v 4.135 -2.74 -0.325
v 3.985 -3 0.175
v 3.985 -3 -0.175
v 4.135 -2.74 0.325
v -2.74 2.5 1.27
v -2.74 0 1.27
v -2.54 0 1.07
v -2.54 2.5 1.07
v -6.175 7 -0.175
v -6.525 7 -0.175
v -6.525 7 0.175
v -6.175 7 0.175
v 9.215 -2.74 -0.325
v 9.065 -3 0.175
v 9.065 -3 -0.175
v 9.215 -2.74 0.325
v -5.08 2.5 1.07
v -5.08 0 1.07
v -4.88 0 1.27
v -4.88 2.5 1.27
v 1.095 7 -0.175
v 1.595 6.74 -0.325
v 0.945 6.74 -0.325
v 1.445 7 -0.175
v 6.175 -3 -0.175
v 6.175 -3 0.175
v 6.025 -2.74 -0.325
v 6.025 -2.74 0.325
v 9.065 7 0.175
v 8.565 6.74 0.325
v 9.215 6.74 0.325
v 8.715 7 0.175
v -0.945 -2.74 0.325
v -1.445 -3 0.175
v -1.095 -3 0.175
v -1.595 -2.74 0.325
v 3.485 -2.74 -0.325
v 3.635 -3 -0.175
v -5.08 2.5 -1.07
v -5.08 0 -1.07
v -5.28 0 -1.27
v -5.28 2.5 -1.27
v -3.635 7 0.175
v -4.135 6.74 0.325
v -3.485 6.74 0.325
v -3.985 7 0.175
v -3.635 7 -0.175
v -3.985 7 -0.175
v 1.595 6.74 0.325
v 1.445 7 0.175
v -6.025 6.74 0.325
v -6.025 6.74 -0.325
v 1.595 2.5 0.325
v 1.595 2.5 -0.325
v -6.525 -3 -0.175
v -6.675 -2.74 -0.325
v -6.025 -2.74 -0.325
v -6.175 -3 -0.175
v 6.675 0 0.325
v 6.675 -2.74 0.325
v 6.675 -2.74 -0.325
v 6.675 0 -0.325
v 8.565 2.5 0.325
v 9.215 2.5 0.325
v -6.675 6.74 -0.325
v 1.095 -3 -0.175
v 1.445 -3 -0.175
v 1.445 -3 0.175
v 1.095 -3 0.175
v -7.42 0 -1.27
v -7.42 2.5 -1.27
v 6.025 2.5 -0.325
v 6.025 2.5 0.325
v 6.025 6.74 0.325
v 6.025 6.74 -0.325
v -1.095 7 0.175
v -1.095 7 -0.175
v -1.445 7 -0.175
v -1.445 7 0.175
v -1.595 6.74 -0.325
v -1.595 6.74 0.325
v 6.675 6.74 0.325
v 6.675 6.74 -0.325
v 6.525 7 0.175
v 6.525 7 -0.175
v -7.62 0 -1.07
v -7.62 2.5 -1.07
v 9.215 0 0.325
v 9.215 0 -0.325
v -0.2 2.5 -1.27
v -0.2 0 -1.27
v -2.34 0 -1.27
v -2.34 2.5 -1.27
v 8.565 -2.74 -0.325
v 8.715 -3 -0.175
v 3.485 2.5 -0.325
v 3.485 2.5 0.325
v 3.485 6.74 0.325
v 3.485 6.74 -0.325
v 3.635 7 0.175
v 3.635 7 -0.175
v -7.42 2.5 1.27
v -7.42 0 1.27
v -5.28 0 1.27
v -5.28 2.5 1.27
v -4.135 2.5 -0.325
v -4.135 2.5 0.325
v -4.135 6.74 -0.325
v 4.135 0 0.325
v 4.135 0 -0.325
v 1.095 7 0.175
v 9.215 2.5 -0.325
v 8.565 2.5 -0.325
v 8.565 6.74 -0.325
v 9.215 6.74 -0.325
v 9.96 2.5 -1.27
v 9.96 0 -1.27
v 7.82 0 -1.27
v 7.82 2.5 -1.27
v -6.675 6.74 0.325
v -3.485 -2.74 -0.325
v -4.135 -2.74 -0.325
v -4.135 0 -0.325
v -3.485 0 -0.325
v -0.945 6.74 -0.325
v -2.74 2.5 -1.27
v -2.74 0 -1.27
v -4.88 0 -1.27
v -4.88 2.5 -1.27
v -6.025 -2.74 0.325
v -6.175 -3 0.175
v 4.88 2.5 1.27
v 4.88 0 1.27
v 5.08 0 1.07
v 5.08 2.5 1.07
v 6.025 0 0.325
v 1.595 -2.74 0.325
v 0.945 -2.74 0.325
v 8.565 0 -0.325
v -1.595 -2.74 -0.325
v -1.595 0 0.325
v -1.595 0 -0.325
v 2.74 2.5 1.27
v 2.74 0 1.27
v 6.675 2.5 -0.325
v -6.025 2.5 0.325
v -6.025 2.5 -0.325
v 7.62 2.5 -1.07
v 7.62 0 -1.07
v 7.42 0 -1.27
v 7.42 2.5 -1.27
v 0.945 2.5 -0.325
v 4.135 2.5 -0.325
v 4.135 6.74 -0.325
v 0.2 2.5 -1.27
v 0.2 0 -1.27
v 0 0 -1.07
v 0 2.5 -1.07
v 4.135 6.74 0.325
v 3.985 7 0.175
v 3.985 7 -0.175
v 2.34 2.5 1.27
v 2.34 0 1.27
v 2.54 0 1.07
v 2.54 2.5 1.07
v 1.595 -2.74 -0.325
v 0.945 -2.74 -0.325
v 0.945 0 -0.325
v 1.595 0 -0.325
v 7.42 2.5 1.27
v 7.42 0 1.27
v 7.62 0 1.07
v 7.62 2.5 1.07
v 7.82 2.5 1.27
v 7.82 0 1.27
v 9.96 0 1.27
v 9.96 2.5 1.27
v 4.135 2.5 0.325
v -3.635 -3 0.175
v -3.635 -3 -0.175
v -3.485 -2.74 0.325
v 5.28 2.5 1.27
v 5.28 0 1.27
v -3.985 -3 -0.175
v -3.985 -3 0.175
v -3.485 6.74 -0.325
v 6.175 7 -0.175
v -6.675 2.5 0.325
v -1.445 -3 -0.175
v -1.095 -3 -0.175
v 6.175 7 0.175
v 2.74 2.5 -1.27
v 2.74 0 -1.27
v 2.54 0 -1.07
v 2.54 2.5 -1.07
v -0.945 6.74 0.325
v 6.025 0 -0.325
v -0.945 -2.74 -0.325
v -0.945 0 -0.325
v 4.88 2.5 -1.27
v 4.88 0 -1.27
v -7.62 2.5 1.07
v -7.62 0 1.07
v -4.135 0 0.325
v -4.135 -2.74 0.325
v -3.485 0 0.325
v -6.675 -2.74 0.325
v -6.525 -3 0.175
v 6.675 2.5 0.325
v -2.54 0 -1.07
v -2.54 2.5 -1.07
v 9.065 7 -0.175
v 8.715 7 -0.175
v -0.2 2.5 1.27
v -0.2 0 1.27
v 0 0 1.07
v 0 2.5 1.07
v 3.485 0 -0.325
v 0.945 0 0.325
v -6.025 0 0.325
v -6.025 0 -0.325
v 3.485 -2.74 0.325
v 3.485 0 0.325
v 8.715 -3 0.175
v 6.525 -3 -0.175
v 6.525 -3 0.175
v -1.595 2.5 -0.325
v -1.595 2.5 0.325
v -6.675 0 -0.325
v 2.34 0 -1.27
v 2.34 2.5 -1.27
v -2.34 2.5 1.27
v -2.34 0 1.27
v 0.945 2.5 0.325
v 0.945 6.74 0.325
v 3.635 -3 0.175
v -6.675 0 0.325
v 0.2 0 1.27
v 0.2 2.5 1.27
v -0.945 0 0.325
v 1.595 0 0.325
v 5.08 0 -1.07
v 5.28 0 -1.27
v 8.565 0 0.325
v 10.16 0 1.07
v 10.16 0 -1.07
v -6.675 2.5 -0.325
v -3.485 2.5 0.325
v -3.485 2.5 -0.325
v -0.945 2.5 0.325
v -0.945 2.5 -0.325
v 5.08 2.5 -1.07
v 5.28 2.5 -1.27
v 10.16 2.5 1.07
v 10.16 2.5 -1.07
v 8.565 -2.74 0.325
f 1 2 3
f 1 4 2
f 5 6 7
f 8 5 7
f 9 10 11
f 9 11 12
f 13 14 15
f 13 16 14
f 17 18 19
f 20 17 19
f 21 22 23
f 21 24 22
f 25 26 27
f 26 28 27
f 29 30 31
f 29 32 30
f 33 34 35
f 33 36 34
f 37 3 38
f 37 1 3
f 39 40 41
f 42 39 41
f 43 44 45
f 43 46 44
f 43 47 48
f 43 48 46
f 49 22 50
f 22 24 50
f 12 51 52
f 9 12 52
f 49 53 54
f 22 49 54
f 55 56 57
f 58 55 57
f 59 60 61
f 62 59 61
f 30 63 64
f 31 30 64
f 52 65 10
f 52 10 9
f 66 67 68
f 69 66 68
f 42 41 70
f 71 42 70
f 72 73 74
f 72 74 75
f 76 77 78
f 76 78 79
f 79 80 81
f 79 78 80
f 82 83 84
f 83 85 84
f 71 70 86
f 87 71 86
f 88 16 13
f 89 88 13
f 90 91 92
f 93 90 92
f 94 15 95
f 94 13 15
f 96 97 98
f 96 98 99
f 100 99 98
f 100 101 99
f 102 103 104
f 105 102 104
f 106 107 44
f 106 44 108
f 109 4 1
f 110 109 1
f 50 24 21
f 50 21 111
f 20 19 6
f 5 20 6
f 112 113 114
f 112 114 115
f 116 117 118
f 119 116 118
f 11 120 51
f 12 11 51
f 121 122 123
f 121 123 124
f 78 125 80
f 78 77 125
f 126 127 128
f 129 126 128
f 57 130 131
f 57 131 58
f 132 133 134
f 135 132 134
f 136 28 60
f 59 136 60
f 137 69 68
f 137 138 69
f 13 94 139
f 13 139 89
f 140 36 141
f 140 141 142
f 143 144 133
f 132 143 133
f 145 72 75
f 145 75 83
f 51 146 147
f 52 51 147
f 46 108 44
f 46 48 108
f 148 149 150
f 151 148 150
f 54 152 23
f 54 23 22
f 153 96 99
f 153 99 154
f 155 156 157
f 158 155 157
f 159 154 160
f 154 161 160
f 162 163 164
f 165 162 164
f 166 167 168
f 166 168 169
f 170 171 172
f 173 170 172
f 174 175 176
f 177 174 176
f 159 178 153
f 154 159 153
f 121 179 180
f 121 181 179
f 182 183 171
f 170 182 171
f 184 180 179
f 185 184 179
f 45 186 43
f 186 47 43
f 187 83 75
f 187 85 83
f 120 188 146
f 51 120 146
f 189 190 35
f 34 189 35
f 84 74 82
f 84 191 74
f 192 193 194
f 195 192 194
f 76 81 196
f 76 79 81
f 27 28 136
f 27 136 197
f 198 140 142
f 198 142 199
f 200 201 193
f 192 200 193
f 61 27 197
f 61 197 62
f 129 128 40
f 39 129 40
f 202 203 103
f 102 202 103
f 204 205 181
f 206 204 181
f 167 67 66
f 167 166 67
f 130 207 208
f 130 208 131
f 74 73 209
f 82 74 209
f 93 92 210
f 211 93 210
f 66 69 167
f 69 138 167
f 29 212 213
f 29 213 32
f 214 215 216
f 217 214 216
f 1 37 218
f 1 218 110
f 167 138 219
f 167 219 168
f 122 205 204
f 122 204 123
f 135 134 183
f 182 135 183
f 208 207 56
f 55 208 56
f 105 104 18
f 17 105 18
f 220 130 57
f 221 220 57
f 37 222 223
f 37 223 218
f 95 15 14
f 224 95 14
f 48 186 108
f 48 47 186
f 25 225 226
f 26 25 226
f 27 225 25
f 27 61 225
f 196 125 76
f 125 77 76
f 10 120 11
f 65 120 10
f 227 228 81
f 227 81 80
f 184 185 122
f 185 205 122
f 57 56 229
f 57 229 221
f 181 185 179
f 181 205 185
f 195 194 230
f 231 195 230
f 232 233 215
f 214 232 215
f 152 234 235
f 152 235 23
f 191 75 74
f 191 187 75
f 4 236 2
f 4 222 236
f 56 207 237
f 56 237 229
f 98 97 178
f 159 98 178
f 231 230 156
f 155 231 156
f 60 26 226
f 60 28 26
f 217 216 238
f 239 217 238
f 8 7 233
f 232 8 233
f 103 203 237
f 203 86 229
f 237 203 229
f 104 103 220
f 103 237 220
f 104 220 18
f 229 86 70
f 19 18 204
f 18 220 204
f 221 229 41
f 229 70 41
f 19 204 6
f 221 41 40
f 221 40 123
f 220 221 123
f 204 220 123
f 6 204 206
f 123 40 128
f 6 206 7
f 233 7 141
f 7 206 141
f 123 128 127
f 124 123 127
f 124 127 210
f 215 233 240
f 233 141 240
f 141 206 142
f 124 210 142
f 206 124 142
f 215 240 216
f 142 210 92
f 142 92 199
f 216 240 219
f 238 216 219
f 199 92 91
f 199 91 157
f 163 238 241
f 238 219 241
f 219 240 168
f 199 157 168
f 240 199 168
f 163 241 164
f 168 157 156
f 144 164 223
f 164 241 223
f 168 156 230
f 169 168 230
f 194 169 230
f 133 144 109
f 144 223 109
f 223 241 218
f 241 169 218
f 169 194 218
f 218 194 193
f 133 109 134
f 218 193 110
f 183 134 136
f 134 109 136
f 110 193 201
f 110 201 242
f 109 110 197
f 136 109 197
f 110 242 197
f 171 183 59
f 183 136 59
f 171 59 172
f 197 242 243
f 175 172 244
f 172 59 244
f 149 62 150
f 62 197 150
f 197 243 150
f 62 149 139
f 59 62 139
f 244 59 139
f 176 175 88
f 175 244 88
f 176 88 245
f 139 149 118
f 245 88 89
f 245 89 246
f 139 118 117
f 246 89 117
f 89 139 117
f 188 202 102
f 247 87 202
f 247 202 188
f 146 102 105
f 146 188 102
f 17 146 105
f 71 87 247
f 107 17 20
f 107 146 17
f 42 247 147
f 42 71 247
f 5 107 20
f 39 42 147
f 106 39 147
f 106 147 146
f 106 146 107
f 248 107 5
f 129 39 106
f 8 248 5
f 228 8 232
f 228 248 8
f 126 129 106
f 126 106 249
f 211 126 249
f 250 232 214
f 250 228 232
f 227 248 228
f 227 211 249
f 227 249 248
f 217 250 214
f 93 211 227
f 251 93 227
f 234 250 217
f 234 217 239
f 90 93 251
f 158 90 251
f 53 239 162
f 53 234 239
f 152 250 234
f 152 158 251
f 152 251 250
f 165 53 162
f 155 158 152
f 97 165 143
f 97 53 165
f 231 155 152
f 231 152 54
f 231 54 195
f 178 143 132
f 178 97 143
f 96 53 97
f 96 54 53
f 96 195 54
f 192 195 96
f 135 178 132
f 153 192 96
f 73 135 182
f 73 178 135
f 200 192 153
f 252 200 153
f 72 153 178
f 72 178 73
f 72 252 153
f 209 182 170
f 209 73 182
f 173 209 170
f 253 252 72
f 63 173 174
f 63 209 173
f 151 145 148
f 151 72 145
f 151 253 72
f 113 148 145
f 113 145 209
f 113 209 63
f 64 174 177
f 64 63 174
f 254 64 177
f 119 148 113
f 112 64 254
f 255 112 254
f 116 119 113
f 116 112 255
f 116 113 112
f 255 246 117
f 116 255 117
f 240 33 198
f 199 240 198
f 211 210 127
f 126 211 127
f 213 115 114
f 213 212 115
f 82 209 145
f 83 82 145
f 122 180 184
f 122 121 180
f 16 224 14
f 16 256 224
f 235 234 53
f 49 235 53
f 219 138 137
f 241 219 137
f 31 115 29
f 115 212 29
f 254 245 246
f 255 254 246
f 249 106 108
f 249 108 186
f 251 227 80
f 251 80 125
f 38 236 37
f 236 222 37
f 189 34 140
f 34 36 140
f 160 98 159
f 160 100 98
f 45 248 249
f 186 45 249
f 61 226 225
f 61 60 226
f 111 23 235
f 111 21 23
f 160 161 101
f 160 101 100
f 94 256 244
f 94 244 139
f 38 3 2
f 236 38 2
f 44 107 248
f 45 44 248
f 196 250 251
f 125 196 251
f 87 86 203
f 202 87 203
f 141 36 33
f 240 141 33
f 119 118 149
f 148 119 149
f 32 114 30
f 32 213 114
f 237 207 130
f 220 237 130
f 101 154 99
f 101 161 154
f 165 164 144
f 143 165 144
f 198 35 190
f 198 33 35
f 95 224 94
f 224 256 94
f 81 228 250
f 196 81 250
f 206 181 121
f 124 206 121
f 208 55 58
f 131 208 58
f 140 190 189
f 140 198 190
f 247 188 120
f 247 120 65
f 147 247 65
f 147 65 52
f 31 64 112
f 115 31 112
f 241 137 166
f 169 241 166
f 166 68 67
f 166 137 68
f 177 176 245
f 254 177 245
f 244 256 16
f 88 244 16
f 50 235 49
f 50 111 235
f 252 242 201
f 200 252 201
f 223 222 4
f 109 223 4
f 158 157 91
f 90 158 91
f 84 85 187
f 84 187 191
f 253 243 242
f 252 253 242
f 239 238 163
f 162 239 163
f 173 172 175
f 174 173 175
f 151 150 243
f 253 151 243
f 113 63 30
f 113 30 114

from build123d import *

# Parameters (mm, degrees)
BOSS_EXTRUDE1_DEPTH   = 2.5
SKETCH3_W             = 0.65
SKETCH3_H             = 0.65
BOSS_EXTRUDE2_DEPTH   = 10
CHAMFER2_SIZE         = 0.15
CHAMFER2_SIZE2        = 0.259807621
CHAMFER3_SIZE         = 0.15
CHAMFER3_SIZE2        = 0.259807621
LPATTERN2_DEPTH       = 2.5
LPATTERN2_START       = -2.740192379
LPATTERN2_2_OUTLINE_W = 0.65
LPATTERN2_2_OUTLINE_H = 0.65
LPATTERN2_2_DEPTH     = 9.480384758


with BuildPart() as part:
    # Sketch1 → Boss-Extrude1 (new body)
    with BuildSketch(Plane(origin=(0, 0, 0), x_dir=(1, 0, 0), z_dir=(0, 1, 0))):
        Polygon((-7.42, 1.27), (-7.62, 1.07), (-7.62, -1.07), (-7.42, -1.27), (-5.28, -1.27), (-5.08, -1.07), (-5.08, 1.07), (-5.28, 1.27), align=None)
    extrude(amount=BOSS_EXTRUDE1_DEPTH)

    # Sketch3 → Boss-Extrude2 (add)
    with BuildSketch(Plane(origin=(0, -3, 0), x_dir=(1, 0, 0), z_dir=(0, 1, 0))):
        with Locations((-6.35, 0)):
            Rectangle(SKETCH3_W, SKETCH3_H)
    extrude(amount=BOSS_EXTRUDE2_DEPTH)

    # Chamfer2
    chamfer2_edges = [part.edges().sort_by_distance(p)[0] for p in [
        (-6.025, -3, 0),
        (-6.35, -3, -0.325),
        (-6.675, -3, 0),
        (-6.35, -3, 0.325),
    ]]
    chamfer2_side = [part.faces().sort_by_distance(p)[0] for p in [
        (-6.35, -3, 0),
    ]]
    chamfer(chamfer2_edges, length=CHAMFER2_SIZE, length2=CHAMFER2_SIZE2, reference=chamfer2_side[0])

    # Chamfer3
    chamfer3_edges = [part.edges().sort_by_distance(p)[0] for p in [
        (-6.025, 7, 0),
        (-6.35, 7, -0.325),
        (-6.675, 7, 0),
        (-6.35, 7, 0.325),
    ]]
    chamfer3_side = [part.faces().sort_by_distance(p)[0] for p in [
        (-6.35, 7, 0),
    ]]
    chamfer(chamfer3_edges, length=CHAMFER3_SIZE, length2=CHAMFER3_SIZE2, reference=chamfer3_side[0])

    # LPattern2: read off the stored shape, not the designer's step
    # LPattern2 outline → LPattern2 (add)
    with BuildSketch(Plane(origin=(0, 0, 0), x_dir=(1, 0, 0), z_dir=(0, 1, 0))):
        Polygon((-2.74, 1.27), (-4.88, 1.27), (-5.08, 1.07), (-5.08, -1.07), (-4.88, -1.27), (-2.74, -1.27), (-2.54, -1.07), (-2.34, -1.27), (-0.2, -1.27), (0, -1.07), (0.2, -1.27), (2.34, -1.27), (2.54, -1.07), (2.74, -1.27), (4.88, -1.27), (5.08, -1.07), (5.28, -1.27), (7.42, -1.27), (7.62, -1.07), (7.82, -1.27), (9.96, -1.27), (10.16, -1.07), (10.16, 1.07), (9.96, 1.27), (7.82, 1.27), (7.62, 1.07), (7.42, 1.27), (5.28, 1.27), (5.08, 1.07), (4.88, 1.27), (2.74, 1.27), (2.54, 1.07), (2.34, 1.27), (0.2, 1.27), (0, 1.07), (-0.2, 1.27), (-2.34, 1.27), (-2.54, 1.07), align=None)
    extrude(amount=LPATTERN2_DEPTH)

    # LPattern2 2 outline → LPattern2 2 (add)
    with BuildSketch(Plane(origin=(0, 0, 0), x_dir=(1, 0, 0), z_dir=(0, 1, 0)).offset(LPATTERN2_START)):
        with Locations((-3.81, 0)):
            Rectangle(LPATTERN2_2_OUTLINE_W, LPATTERN2_2_OUTLINE_H)
        with Locations((-1.27, 0)):
            Rectangle(LPATTERN2_2_OUTLINE_W, LPATTERN2_2_OUTLINE_H)
        with Locations((1.27, 0)):
            Rectangle(LPATTERN2_2_OUTLINE_W, LPATTERN2_2_OUTLINE_H)
        with Locations((3.81, 0)):
            Rectangle(LPATTERN2_2_OUTLINE_W, LPATTERN2_2_OUTLINE_H)
        with Locations((6.35, 0)):
            Rectangle(LPATTERN2_2_OUTLINE_W, LPATTERN2_2_OUTLINE_H)
        with Locations((8.89, 0)):
            Rectangle(LPATTERN2_2_OUTLINE_W, LPATTERN2_2_OUTLINE_H)
    extrude(amount=LPATTERN2_2_DEPTH)

    # LPattern2 3: loft between two sections, ruled curve by curve
    lpattern2_3_from = [
        Edge.make_line((-3.985, -3, 0.175), (-3.635, -3, 0.175)),
        Edge.make_line((-3.635, -3, -0.175), (-3.985, -3, -0.175)),
        Edge.make_line((-3.635, -3, 0.175), (-3.635, -3, -0.175)),
        Edge.make_line((-3.985, -3, 0.175), (-3.985, -3, -0.175)),
    ]
    lpattern2_3_to = [
        Edge.make_line((-4.135, -2.740192379, 0.325), (-3.485, -2.740192379, 0.325)),
        Edge.make_line((-3.485, -2.740192379, -0.325), (-4.135, -2.740192379, -0.325)),
        Edge.make_line((-3.485, -2.740192379, 0.325), (-3.485, -2.740192379, -0.325)),
        Edge.make_line((-4.135, -2.740192379, 0.325), (-4.135, -2.740192379, -0.325)),
    ]
    lpattern2_3 = Solid(Shell([*[Face.make_surface_from_curves(lpattern2_3_from[k], lpattern2_3_to[k]) for k in range(4)], Face(Wire(lpattern2_3_from)), Face(Wire(lpattern2_3_to))]))
    add(lpattern2_3)

    # LPattern2 4: loft between two sections, ruled curve by curve
    lpattern2_4_from = [
        Edge.make_line((-1.445, -3, 0.175), (-1.095, -3, 0.175)),
        Edge.make_line((-1.095, -3, -0.175), (-1.445, -3, -0.175)),
        Edge.make_line((-1.095, -3, 0.175), (-1.095, -3, -0.175)),
        Edge.make_line((-1.445, -3, 0.175), (-1.445, -3, -0.175)),
    ]
    lpattern2_4_to = [
        Edge.make_line((-1.595, -2.740192379, 0.325), (-0.945, -2.740192379, 0.325)),
        Edge.make_line((-0.945, -2.740192379, -0.325), (-1.595, -2.740192379, -0.325)),
        Edge.make_line((-0.945, -2.740192379, 0.325), (-0.945, -2.740192379, -0.325)),
        Edge.make_line((-1.595, -2.740192379, 0.325), (-1.595, -2.740192379, -0.325)),
    ]
    lpattern2_4 = Solid(Shell([*[Face.make_surface_from_curves(lpattern2_4_from[k], lpattern2_4_to[k]) for k in range(4)], Face(Wire(lpattern2_4_from)), Face(Wire(lpattern2_4_to))]))
    add(lpattern2_4)

    # LPattern2 5: loft between two sections, ruled curve by curve
    lpattern2_5_from = [
        Edge.make_line((1.095, -3, 0.175), (1.445, -3, 0.175)),
        Edge.make_line((1.445, -3, -0.175), (1.095, -3, -0.175)),
        Edge.make_line((1.445, -3, 0.175), (1.445, -3, -0.175)),
        Edge.make_line((1.095, -3, 0.175), (1.095, -3, -0.175)),
    ]
    lpattern2_5_to = [
        Edge.make_line((0.945, -2.740192379, 0.325), (1.595, -2.740192379, 0.325)),
        Edge.make_line((1.595, -2.740192379, -0.325), (0.945, -2.740192379, -0.325)),
        Edge.make_line((1.595, -2.740192379, 0.325), (1.595, -2.740192379, -0.325)),
        Edge.make_line((0.945, -2.740192379, 0.325), (0.945, -2.740192379, -0.325)),
    ]
    lpattern2_5 = Solid(Shell([*[Face.make_surface_from_curves(lpattern2_5_from[k], lpattern2_5_to[k]) for k in range(4)], Face(Wire(lpattern2_5_from)), Face(Wire(lpattern2_5_to))]))
    add(lpattern2_5)

    # LPattern2 6: loft between two sections, ruled curve by curve
    lpattern2_6_from = [
        Edge.make_line((3.635, -3, 0.175), (3.985, -3, 0.175)),
        Edge.make_line((3.985, -3, -0.175), (3.635, -3, -0.175)),
        Edge.make_line((3.985, -3, 0.175), (3.985, -3, -0.175)),
        Edge.make_line((3.635, -3, 0.175), (3.635, -3, -0.175)),
    ]
    lpattern2_6_to = [
        Edge.make_line((3.485, -2.740192379, 0.325), (4.135, -2.740192379, 0.325)),
        Edge.make_line((4.135, -2.740192379, -0.325), (3.485, -2.740192379, -0.325)),
        Edge.make_line((4.135, -2.740192379, 0.325), (4.135, -2.740192379, -0.325)),
        Edge.make_line((3.485, -2.740192379, 0.325), (3.485, -2.740192379, -0.325)),
    ]
    lpattern2_6 = Solid(Shell([*[Face.make_surface_from_curves(lpattern2_6_from[k], lpattern2_6_to[k]) for k in range(4)], Face(Wire(lpattern2_6_from)), Face(Wire(lpattern2_6_to))]))
    add(lpattern2_6)

    # LPattern2 7: loft between two sections, ruled curve by curve
    lpattern2_7_from = [
        Edge.make_line((6.175, -3, 0.175), (6.525, -3, 0.175)),
        Edge.make_line((6.525, -3, -0.175), (6.175, -3, -0.175)),
        Edge.make_line((6.525, -3, 0.175), (6.525, -3, -0.175)),
        Edge.make_line((6.175, -3, 0.175), (6.175, -3, -0.175)),
    ]
    lpattern2_7_to = [
        Edge.make_line((6.025, -2.740192379, 0.325), (6.675, -2.740192379, 0.325)),
        Edge.make_line((6.675, -2.740192379, -0.325), (6.025, -2.740192379, -0.325)),
        Edge.make_line((6.675, -2.740192379, 0.325), (6.675, -2.740192379, -0.325)),
        Edge.make_line((6.025, -2.740192379, 0.325), (6.025, -2.740192379, -0.325)),
    ]
    lpattern2_7 = Solid(Shell([*[Face.make_surface_from_curves(lpattern2_7_from[k], lpattern2_7_to[k]) for k in range(4)], Face(Wire(lpattern2_7_from)), Face(Wire(lpattern2_7_to))]))
    add(lpattern2_7)

    # LPattern2 8: loft between two sections, ruled curve by curve
    lpattern2_8_from = [
        Edge.make_line((8.715, -3, 0.175), (9.065, -3, 0.175)),
        Edge.make_line((9.065, -3, -0.175), (8.715, -3, -0.175)),
        Edge.make_line((9.065, -3, 0.175), (9.065, -3, -0.175)),
        Edge.make_line((8.715, -3, 0.175), (8.715, -3, -0.175)),
    ]
    lpattern2_8_to = [
        Edge.make_line((8.565, -2.740192379, 0.325), (9.215, -2.740192379, 0.325)),
        Edge.make_line((9.215, -2.740192379, -0.325), (8.565, -2.740192379, -0.325)),
        Edge.make_line((9.215, -2.740192379, 0.325), (9.215, -2.740192379, -0.325)),
        Edge.make_line((8.565, -2.740192379, 0.325), (8.565, -2.740192379, -0.325)),
    ]
    lpattern2_8 = Solid(Shell([*[Face.make_surface_from_curves(lpattern2_8_from[k], lpattern2_8_to[k]) for k in range(4)], Face(Wire(lpattern2_8_from)), Face(Wire(lpattern2_8_to))]))
    add(lpattern2_8)

    # LPattern2 9: loft between two sections, ruled curve by curve
    lpattern2_9_from = [
        Edge.make_line((-3.485, 6.740192379, -0.325), (-4.135, 6.740192379, -0.325)),
        Edge.make_line((-4.135, 6.740192379, 0.325), (-3.485, 6.740192379, 0.325)),
        Edge.make_line((-4.135, 6.740192379, -0.325), (-4.135, 6.740192379, 0.325)),
        Edge.make_line((-3.485, 6.740192379, -0.325), (-3.485, 6.740192379, 0.325)),
    ]
    lpattern2_9_to = [
        Edge.make_line((-3.635, 7, -0.175), (-3.985, 7, -0.175)),
        Edge.make_line((-3.985, 7, 0.175), (-3.635, 7, 0.175)),
        Edge.make_line((-3.985, 7, -0.175), (-3.985, 7, 0.175)),
        Edge.make_line((-3.635, 7, -0.175), (-3.635, 7, 0.175)),
    ]
    lpattern2_9 = Solid(Shell([*[Face.make_surface_from_curves(lpattern2_9_from[k], lpattern2_9_to[k]) for k in range(4)], Face(Wire(lpattern2_9_from)), Face(Wire(lpattern2_9_to))]))
    add(lpattern2_9)

    # LPattern2 10: loft between two sections, ruled curve by curve
    lpattern2_10_from = [
        Edge.make_line((-0.945, 6.740192379, -0.325), (-1.595, 6.740192379, -0.325)),
        Edge.make_line((-1.595, 6.740192379, 0.325), (-0.945, 6.740192379, 0.325)),
        Edge.make_line((-1.595, 6.740192379, -0.325), (-1.595, 6.740192379, 0.325)),
        Edge.make_line((-0.945, 6.740192379, -0.325), (-0.945, 6.740192379, 0.325)),
    ]
    lpattern2_10_to = [
        Edge.make_line((-1.095, 7, -0.175), (-1.445, 7, -0.175)),
        Edge.make_line((-1.445, 7, 0.175), (-1.095, 7, 0.175)),
        Edge.make_line((-1.445, 7, -0.175), (-1.445, 7, 0.175)),
        Edge.make_line((-1.095, 7, -0.175), (-1.095, 7, 0.175)),
    ]
    lpattern2_10 = Solid(Shell([*[Face.make_surface_from_curves(lpattern2_10_from[k], lpattern2_10_to[k]) for k in range(4)], Face(Wire(lpattern2_10_from)), Face(Wire(lpattern2_10_to))]))
    add(lpattern2_10)

    # LPattern2 11: loft between two sections, ruled curve by curve
    lpattern2_11_from = [
        Edge.make_line((1.595, 6.740192379, -0.325), (0.945, 6.740192379, -0.325)),
        Edge.make_line((0.945, 6.740192379, 0.325), (1.595, 6.740192379, 0.325)),
        Edge.make_line((0.945, 6.740192379, -0.325), (0.945, 6.740192379, 0.325)),
        Edge.make_line((1.595, 6.740192379, -0.325), (1.595, 6.740192379, 0.325)),
    ]
    lpattern2_11_to = [
        Edge.make_line((1.445, 7, -0.175), (1.095, 7, -0.175)),
        Edge.make_line((1.095, 7, 0.175), (1.445, 7, 0.175)),
        Edge.make_line((1.095, 7, -0.175), (1.095, 7, 0.175)),
        Edge.make_line((1.445, 7, -0.175), (1.445, 7, 0.175)),
    ]
    lpattern2_11 = Solid(Shell([*[Face.make_surface_from_curves(lpattern2_11_from[k], lpattern2_11_to[k]) for k in range(4)], Face(Wire(lpattern2_11_from)), Face(Wire(lpattern2_11_to))]))
    add(lpattern2_11)

    # LPattern2 12: loft between two sections, ruled curve by curve
    lpattern2_12_from = [
        Edge.make_line((4.135, 6.740192379, -0.325), (3.485, 6.740192379, -0.325)),
        Edge.make_line((3.485, 6.740192379, 0.325), (4.135, 6.740192379, 0.325)),
        Edge.make_line((3.485, 6.740192379, -0.325), (3.485, 6.740192379, 0.325)),
        Edge.make_line((4.135, 6.740192379, -0.325), (4.135, 6.740192379, 0.325)),
    ]
    lpattern2_12_to = [
        Edge.make_line((3.985, 7, -0.175), (3.635, 7, -0.175)),
        Edge.make_line((3.635, 7, 0.175), (3.985, 7, 0.175)),
        Edge.make_line((3.635, 7, -0.175), (3.635, 7, 0.175)),
        Edge.make_line((3.985, 7, -0.175), (3.985, 7, 0.175)),
    ]
    lpattern2_12 = Solid(Shell([*[Face.make_surface_from_curves(lpattern2_12_from[k], lpattern2_12_to[k]) for k in range(4)], Face(Wire(lpattern2_12_from)), Face(Wire(lpattern2_12_to))]))
    add(lpattern2_12)

    # LPattern2 13: loft between two sections, ruled curve by curve
    lpattern2_13_from = [
        Edge.make_line((6.675, 6.740192379, -0.325), (6.025, 6.740192379, -0.325)),
        Edge.make_line((6.025, 6.740192379, 0.325), (6.675, 6.740192379, 0.325)),
        Edge.make_line((6.025, 6.740192379, -0.325), (6.025, 6.740192379, 0.325)),
        Edge.make_line((6.675, 6.740192379, -0.325), (6.675, 6.740192379, 0.325)),
    ]
    lpattern2_13_to = [
        Edge.make_line((6.525, 7, -0.175), (6.175, 7, -0.175)),
        Edge.make_line((6.175, 7, 0.175), (6.525, 7, 0.175)),
        Edge.make_line((6.175, 7, -0.175), (6.175, 7, 0.175)),
        Edge.make_line((6.525, 7, -0.175), (6.525, 7, 0.175)),
    ]
    lpattern2_13 = Solid(Shell([*[Face.make_surface_from_curves(lpattern2_13_from[k], lpattern2_13_to[k]) for k in range(4)], Face(Wire(lpattern2_13_from)), Face(Wire(lpattern2_13_to))]))
    add(lpattern2_13)

    # LPattern2 14: loft between two sections, ruled curve by curve
    lpattern2_14_from = [
        Edge.make_line((9.215, 6.740192379, -0.325), (8.565, 6.740192379, -0.325)),
        Edge.make_line((8.565, 6.740192379, 0.325), (9.215, 6.740192379, 0.325)),
        Edge.make_line((8.565, 6.740192379, -0.325), (8.565, 6.740192379, 0.325)),
        Edge.make_line((9.215, 6.740192379, -0.325), (9.215, 6.740192379, 0.325)),
    ]
    lpattern2_14_to = [
        Edge.make_line((9.065, 7, -0.175), (8.715, 7, -0.175)),
        Edge.make_line((8.715, 7, 0.175), (9.065, 7, 0.175)),
        Edge.make_line((8.715, 7, -0.175), (8.715, 7, 0.175)),
        Edge.make_line((9.065, 7, -0.175), (9.065, 7, 0.175)),
    ]
    lpattern2_14 = Solid(Shell([*[Face.make_surface_from_curves(lpattern2_14_from[k], lpattern2_14_to[k]) for k in range(4)], Face(Wire(lpattern2_14_from)), Face(Wire(lpattern2_14_to))]))
    add(lpattern2_14)


solid = part.part
